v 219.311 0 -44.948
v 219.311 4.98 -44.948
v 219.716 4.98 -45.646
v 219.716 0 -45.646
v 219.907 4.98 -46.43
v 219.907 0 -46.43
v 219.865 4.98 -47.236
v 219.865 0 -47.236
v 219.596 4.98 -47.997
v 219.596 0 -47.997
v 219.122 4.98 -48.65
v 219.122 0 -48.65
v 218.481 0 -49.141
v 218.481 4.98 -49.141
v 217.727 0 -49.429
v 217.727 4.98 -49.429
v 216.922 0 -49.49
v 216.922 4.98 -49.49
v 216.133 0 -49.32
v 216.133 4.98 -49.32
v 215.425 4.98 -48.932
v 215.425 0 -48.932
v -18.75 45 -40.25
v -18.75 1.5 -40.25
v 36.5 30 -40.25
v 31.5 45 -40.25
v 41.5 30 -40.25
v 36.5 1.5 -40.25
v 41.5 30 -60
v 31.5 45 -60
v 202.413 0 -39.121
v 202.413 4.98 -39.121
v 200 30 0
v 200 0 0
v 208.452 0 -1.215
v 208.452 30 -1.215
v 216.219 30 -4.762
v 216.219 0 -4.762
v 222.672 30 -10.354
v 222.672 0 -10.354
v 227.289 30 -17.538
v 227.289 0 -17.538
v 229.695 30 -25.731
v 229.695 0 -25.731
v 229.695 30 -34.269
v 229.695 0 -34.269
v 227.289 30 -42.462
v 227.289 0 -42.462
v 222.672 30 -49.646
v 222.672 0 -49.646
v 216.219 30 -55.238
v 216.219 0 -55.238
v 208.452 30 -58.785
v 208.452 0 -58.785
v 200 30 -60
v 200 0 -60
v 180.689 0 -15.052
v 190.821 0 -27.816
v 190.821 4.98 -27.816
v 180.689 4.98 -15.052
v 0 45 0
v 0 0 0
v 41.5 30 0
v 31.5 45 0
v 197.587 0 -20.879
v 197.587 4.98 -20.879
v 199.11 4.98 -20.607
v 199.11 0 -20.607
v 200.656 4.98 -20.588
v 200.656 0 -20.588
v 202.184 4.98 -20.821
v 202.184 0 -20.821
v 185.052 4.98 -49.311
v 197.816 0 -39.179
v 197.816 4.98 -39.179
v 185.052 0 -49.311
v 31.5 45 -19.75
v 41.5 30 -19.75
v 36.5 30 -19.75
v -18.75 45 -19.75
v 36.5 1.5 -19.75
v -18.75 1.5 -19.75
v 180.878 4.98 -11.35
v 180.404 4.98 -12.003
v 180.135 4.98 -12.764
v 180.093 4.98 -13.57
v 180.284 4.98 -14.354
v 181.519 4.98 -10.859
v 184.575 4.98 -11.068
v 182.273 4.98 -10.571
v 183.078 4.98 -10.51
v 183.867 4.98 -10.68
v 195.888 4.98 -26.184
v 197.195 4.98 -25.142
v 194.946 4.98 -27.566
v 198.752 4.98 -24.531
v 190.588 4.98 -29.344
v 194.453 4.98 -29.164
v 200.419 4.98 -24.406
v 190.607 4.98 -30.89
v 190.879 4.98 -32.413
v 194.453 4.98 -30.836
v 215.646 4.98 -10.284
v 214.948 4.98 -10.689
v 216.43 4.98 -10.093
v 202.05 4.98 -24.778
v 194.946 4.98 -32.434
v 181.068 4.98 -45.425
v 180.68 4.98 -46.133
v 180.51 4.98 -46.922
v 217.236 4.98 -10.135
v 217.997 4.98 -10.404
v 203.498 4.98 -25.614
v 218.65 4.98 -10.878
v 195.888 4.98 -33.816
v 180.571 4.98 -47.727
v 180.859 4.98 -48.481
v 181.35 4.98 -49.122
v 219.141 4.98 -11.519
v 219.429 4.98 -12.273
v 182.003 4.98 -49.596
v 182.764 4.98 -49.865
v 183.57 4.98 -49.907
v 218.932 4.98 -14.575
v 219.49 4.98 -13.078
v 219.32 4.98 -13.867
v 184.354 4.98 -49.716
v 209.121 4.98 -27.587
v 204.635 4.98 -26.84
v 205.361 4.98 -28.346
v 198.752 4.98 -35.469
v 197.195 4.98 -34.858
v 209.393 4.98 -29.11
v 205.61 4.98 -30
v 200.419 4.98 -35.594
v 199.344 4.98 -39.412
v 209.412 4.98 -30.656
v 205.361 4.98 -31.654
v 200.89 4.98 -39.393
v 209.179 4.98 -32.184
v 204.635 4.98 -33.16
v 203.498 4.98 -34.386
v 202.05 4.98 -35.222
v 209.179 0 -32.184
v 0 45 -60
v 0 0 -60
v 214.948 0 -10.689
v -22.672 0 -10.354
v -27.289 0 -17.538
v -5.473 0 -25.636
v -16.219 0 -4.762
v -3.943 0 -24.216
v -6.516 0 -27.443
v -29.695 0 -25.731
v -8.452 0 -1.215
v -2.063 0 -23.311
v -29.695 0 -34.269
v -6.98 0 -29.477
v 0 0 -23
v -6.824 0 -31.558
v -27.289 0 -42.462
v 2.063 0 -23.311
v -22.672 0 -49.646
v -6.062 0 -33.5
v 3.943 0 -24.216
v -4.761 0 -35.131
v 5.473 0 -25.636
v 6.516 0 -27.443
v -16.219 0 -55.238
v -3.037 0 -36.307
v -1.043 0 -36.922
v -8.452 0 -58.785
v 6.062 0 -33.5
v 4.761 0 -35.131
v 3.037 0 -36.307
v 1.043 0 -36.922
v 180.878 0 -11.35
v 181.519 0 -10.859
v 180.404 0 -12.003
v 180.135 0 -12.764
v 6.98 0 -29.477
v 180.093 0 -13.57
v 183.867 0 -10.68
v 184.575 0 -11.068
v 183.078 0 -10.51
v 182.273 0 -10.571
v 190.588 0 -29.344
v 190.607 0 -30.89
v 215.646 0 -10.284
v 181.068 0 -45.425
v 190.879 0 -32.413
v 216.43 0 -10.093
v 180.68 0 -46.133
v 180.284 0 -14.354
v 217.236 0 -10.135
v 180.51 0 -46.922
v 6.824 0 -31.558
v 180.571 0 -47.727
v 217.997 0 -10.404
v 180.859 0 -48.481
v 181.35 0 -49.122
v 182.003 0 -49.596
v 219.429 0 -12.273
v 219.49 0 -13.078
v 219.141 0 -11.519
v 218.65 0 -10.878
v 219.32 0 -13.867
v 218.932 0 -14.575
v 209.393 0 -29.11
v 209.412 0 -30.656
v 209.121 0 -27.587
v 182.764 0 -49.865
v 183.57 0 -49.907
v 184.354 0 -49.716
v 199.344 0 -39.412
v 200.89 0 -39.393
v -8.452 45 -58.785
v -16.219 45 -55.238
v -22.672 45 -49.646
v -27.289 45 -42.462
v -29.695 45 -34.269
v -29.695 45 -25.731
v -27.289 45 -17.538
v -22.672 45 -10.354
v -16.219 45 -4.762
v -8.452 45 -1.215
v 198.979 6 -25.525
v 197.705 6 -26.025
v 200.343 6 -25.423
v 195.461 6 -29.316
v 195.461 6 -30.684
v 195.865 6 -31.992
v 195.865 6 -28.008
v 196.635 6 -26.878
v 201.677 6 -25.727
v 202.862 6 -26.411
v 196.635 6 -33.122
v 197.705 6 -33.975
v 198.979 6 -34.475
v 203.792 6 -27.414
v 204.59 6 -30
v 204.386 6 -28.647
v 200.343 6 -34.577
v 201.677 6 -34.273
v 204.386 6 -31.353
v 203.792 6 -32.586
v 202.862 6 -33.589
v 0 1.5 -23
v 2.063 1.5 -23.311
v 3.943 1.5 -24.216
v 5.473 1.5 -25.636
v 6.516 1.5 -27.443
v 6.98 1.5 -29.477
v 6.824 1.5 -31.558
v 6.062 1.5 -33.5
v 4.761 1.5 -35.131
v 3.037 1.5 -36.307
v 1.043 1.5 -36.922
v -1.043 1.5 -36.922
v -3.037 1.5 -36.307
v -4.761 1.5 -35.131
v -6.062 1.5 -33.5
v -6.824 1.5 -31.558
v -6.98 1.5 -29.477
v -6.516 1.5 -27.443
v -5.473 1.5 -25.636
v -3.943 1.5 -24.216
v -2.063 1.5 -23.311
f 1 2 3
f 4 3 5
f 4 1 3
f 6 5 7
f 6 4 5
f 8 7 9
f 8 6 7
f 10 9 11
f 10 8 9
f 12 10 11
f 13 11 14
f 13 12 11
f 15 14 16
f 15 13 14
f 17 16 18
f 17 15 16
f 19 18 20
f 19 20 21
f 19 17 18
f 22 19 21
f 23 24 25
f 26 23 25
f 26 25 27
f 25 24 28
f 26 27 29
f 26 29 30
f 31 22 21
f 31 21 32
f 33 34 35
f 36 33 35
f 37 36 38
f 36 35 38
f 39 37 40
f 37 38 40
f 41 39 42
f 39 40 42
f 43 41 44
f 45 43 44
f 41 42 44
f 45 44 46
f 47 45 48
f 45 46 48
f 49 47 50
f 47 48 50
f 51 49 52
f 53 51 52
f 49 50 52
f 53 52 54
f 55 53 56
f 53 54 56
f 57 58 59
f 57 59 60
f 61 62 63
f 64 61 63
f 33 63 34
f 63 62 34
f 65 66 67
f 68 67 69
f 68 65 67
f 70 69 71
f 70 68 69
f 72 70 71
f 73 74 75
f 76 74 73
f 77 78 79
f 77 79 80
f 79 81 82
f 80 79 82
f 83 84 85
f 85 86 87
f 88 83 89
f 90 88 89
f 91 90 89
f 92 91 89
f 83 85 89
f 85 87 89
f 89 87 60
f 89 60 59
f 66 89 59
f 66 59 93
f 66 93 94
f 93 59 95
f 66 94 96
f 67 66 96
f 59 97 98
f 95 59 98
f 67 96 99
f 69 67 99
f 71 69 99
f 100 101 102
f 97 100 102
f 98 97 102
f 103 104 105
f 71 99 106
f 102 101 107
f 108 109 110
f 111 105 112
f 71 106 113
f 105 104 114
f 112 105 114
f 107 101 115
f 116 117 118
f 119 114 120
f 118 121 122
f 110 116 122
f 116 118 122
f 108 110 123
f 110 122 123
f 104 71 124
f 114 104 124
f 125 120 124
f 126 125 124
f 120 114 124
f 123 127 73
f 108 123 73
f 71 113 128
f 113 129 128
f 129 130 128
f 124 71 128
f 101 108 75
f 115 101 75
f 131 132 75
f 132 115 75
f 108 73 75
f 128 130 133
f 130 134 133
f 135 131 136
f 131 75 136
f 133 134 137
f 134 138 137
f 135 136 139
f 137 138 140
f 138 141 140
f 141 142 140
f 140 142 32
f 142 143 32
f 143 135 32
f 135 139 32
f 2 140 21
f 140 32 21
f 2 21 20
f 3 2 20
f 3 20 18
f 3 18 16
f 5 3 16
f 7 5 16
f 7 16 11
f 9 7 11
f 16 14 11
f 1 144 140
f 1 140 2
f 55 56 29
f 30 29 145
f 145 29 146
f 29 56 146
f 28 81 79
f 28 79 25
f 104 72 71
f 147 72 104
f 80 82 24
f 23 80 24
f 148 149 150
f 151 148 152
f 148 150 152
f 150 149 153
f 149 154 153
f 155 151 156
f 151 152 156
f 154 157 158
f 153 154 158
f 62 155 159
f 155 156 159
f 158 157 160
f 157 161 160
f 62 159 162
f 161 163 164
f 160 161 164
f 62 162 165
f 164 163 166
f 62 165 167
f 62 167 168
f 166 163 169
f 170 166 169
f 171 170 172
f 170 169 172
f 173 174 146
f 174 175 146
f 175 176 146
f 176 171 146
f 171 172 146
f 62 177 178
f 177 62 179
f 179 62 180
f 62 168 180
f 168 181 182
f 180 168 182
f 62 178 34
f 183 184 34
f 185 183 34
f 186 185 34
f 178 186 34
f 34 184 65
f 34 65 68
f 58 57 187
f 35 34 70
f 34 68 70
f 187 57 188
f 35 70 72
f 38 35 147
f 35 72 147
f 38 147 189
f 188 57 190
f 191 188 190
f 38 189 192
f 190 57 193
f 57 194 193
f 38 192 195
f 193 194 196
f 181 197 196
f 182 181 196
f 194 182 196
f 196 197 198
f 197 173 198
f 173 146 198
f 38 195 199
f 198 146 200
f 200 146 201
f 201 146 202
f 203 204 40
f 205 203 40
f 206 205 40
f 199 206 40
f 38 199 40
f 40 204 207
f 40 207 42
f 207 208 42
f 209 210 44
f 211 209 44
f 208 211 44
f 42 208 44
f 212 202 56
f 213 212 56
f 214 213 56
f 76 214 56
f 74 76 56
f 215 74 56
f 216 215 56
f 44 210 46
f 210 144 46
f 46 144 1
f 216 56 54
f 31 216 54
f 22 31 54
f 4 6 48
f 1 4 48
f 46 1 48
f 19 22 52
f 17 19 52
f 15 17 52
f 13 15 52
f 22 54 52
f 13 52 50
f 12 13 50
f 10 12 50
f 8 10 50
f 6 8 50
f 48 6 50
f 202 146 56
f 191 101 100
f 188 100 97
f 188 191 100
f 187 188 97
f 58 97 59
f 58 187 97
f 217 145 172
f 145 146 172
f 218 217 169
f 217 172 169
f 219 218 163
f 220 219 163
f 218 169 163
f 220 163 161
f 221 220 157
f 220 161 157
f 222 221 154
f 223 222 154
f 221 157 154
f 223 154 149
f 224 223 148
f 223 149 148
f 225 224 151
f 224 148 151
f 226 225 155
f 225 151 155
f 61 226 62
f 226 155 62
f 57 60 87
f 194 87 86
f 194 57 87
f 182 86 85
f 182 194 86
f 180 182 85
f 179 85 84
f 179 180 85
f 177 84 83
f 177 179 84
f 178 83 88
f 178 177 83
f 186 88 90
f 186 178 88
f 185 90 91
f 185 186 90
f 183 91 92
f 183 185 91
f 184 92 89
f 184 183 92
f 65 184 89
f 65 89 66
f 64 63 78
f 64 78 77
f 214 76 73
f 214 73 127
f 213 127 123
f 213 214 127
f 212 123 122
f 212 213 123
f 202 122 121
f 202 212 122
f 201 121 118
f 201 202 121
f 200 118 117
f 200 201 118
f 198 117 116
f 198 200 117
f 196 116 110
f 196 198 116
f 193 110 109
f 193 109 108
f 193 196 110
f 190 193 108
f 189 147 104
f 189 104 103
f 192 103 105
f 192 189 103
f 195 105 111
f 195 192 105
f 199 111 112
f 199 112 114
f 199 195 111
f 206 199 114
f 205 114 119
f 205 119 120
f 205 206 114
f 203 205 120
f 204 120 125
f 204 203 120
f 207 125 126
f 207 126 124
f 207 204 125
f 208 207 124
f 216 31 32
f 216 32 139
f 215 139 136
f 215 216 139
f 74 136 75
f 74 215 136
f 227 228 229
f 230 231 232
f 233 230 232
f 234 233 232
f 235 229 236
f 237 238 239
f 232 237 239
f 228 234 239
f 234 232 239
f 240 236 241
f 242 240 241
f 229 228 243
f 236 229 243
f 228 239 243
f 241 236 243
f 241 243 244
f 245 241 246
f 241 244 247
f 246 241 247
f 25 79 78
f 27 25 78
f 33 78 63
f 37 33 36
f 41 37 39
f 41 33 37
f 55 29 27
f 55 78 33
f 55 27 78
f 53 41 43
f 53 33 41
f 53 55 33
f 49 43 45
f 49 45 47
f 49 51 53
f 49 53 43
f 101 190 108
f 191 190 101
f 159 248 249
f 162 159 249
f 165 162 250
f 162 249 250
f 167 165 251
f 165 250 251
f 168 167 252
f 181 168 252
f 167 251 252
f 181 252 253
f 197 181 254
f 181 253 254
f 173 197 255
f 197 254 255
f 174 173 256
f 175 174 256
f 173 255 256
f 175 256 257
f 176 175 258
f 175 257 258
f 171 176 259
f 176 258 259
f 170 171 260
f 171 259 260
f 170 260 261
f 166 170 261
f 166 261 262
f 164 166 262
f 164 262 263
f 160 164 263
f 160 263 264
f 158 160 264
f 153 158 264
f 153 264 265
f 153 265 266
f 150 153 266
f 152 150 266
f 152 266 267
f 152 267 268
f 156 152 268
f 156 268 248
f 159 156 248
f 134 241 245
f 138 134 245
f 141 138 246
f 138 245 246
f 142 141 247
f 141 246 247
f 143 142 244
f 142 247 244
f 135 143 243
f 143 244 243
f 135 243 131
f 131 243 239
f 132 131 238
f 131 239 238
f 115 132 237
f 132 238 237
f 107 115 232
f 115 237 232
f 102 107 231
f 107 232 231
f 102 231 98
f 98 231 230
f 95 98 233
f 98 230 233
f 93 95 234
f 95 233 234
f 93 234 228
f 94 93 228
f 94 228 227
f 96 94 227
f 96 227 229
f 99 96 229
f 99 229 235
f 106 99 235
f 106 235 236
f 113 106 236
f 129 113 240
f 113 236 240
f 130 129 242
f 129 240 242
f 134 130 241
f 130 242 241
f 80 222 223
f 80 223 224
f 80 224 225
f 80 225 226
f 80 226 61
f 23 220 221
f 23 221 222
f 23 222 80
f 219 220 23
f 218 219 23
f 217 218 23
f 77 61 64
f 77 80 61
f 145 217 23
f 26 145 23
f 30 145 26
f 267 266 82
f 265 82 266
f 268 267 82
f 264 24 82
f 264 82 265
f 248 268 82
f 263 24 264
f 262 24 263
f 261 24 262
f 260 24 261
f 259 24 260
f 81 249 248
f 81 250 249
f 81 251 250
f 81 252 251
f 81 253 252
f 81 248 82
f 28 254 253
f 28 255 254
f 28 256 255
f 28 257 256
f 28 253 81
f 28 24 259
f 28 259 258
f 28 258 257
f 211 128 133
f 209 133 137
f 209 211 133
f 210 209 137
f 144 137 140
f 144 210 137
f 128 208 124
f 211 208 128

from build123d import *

# Parameters (mm, degrees)
BOSS_EXTRUDE1_DEPTH = 30
SKETCH2_R           = 7
CUT_EXTRUDE1_DEPTH  = 240.582971014
CUT_EXTRUDE2_DEPTH  = 28.5
BOSS_EXTRUDE2_DEPTH = 15
CUT_EXTRUDE3_DEPTH  = 242.919408068
CAVITY1_START       = -1
CAVITY1_OUTLINE_R   = 1.02
CAVITY1_DEPTH       = 5.98
CAVITY1_START_2     = 2.94
CAVITY1_2_OUTLINE_R = 1.683
CAVITY1_2_DEPTH     = 2.04
CAVITY1_START_3     = 4.98
CAVITY1_3_OUTLINE_R = 2.805
CAVITY1_3_DEPTH     = 1.02
SKETCH6_R           = 1.02
SKETCH6_R_2         = 5.61
CUT_EXTRUDE4_DEPTH  = 4.98
CUT_EXTRUDE5_START  = -1.02
SKETCH7_R           = 2.805
CUT_EXTRUDE5_DEPTH  = 1.02


with BuildPart() as part:
    # Sketch1 → Boss-Extrude1 (new body)
    with BuildSketch(Plane(origin=(0, 0, 0), x_dir=(1, 0, 0), z_dir=(0, 1, 0))):
        with BuildLine():
            Line((0, 0), (200, 0))
            ThreePointArc((200, 0), (230, 30), (200, 60))
            Line((200, 60), (0, 60))
            ThreePointArc((0, 60), (-30, 30), (0, 0))
        make_face()
    extrude(amount=BOSS_EXTRUDE1_DEPTH)

    # Sketch2 → Cut-Extrude1 (cut, through all)
    with BuildSketch(Plane(origin=(0, 30, 0), x_dir=(1, 0, 0), z_dir=(0, 1, 0))):
        with Locations(Location((0, 30, 0), (0, 0, 270))):
            Circle(SKETCH2_R)
    extrude(amount=-CUT_EXTRUDE1_DEPTH, mode=Mode.SUBTRACT)

    # Sketch3 → Cut-Extrude2 (cut)
    with BuildSketch(Plane(origin=(0, 30, 0), x_dir=(1, 0, 0), z_dir=(0, 1, 0))):
        Polygon((-18.75, 40.25), (-18.75, 19.75), (0, 19.75), (36.5, 19.75), (36.5, 40.25), (0, 40.25), align=None)
    extrude(amount=-CUT_EXTRUDE2_DEPTH, mode=Mode.SUBTRACT)

    # Sketch4 → Boss-Extrude2 (add)
    with BuildSketch(Plane(origin=(0, 30, 0), x_dir=(1, 0, 0), z_dir=(0, 1, 0))):
        with BuildLine():
            Line((-18.75, 40.25), (41.5, 40.25))
            Line((41.5, 40.25), (41.5, 60))
            Line((41.5, 60), (0, 60))
            ThreePointArc((0, 60), (-30, 30), (0, 0))
            Line((0, 0), (41.5, 0))
            Line((41.5, 0), (41.5, 19.75))
            Line((41.5, 19.75), (-18.75, 19.75))
            Line((-18.75, 19.75), (-18.75, 40.25))
        make_face()
    extrude(amount=BOSS_EXTRUDE2_DEPTH)

    # Sketch5 → Cut-Extrude3 (cut, through all)
    with BuildSketch(Plane.XY):
        Polygon((31.5, 45), (41.5, 45), (41.5, 30), align=None)
    extrude(amount=-CUT_EXTRUDE3_DEPTH, mode=Mode.SUBTRACT)

    # Cavity1: read off the stored shape, not the designer's step
    # Cavity1 outline → Cavity1 (cut)
    with BuildSketch(Plane(origin=(0, 0, 0), x_dir=(1, 0, 0), z_dir=(0, 1, 0)).offset(CAVITY1_START)):
        with BuildLine():
            Line((215.425139365, 48.931566971), (202.412835688, 39.121263561))
            ThreePointArc((202.412835688, 39.121263561), (200.117760104, 39.434265078), (197.815586916, 39.178647203))
            Line((197.815586916, 39.178647203), (185.052206965, 49.310687088))
            ThreePointArc((185.052206965, 49.310687088), (181.349681661, 49.121796309), (181.068433029, 45.425139365))
            Line((181.068433029, 45.425139365), (190.878736439, 32.412835688))
            ThreePointArc((190.878736439, 32.412835688), (190.565734922, 30.117760104), (190.821352797, 27.815586916))
            Line((190.821352797, 27.815586916), (180.689312912, 15.052206965))
            ThreePointArc((180.689312912, 15.052206965), (180.878203691, 11.349681661), (184.574860635, 11.068433029))
            Line((184.574860635, 11.068433029), (197.587164312, 20.878736439))
            ThreePointArc((197.587164312, 20.878736439), (199.882239896, 20.565734922), (202.184413084, 20.821352797))
            Line((202.184413084, 20.821352797), (214.947793035, 10.689312912))
            ThreePointArc((214.947793035, 10.689312912), (218.650318339, 10.878203691), (218.931566971, 14.574860635))
            Line((218.931566971, 14.574860635), (209.121263561, 27.587164312))
            ThreePointArc((209.121263561, 27.587164312), (209.434265078, 29.882239896), (209.178647203, 32.184413084))
            Line((209.178647203, 32.184413084), (219.310687088, 44.947793035))
            ThreePointArc((219.310687088, 44.947793035), (219.121796309, 48.650318339), (215.425139365, 48.931566971))
        make_face()
        with Locations((183.022971201, 13.441566555)):
            Circle(CAVITY1_OUTLINE_R, mode=Mode.SUBTRACT)
        with Locations((186.673945136, 17.002519984)):
            Circle(CAVITY1_OUTLINE_R, mode=Mode.SUBTRACT)
        with Locations((190.324919072, 20.563473413)):
            Circle(CAVITY1_OUTLINE_R, mode=Mode.SUBTRACT)
        with Locations((193.975893007, 24.124426842)):
            Circle(CAVITY1_OUTLINE_R, mode=Mode.SUBTRACT)
        with Locations((216.558433445, 13.022971201)):
            Circle(CAVITY1_OUTLINE_R, mode=Mode.SUBTRACT)
        with Locations((212.997480016, 16.673945136)):
            Circle(CAVITY1_OUTLINE_R, mode=Mode.SUBTRACT)
        with Locations((209.436526587, 20.324919072)):
            Circle(CAVITY1_OUTLINE_R, mode=Mode.SUBTRACT)
        with Locations((205.875573158, 23.975893007)):
            Circle(CAVITY1_OUTLINE_R, mode=Mode.SUBTRACT)
        with Locations((194.124426842, 36.024106993)):
            Circle(CAVITY1_OUTLINE_R, mode=Mode.SUBTRACT)
        with Locations((190.563473413, 39.675080928)):
            Circle(CAVITY1_OUTLINE_R, mode=Mode.SUBTRACT)
        with Locations((187.002519984, 43.326054864)):
            Circle(CAVITY1_OUTLINE_R, mode=Mode.SUBTRACT)
        with Locations((183.441566555, 46.977028799)):
            Circle(CAVITY1_OUTLINE_R, mode=Mode.SUBTRACT)
        with BuildLine():
            Line((202.58182093, 32.319782958), (203.124264185, 32.623999486))
            ThreePointArc((203.124264185, 32.623999486), (203.267629631, 32.443153003), (203.400540503, 32.254489806))
            Line((203.400540503, 32.254489806), (202.955317585, 31.82024456))
            Line((202.955317585, 31.82024456), (203.094251525, 31.572513843))
            Line((203.094251525, 31.572513843), (203.696948506, 31.725969798))
            ThreePointArc((203.696948506, 31.725969798), (203.788622379, 31.514179802), (203.868174794, 31.297545283))
            Line((203.868174794, 31.297545283), (203.325731539, 30.993328755))
            Line((203.325731539, 30.993328755), (203.395813992, 30.718080508))
            Line((203.395813992, 30.718080508), (204.017691895, 30.710318122))
            ThreePointArc((204.017691895, 30.710318122), (204.051426772, 30.48201775), (204.072199365, 30.252175193))
            Line((204.072199365, 30.252175193), (203.469502385, 30.098719237))
            Line((203.469502385, 30.098719237), (203.465957348, 29.814711173))
            Line((203.465957348, 29.814711173), (204.064636222, 29.646259439))
            ThreePointArc((204.064636222, 29.646259439), (204.038133126, 29.417006985), (203.99871028, 29.189619781))
            Line((203.99871028, 29.189619781), (203.376832377, 29.197382167))
            Line((203.376832377, 29.197382167), (203.299901438, 28.923968965))
            Line((203.299901438, 28.923968965), (203.834582307, 28.60630759))
            ThreePointArc((203.834582307, 28.60630759), (203.749647381, 28.391726231), (203.652715696, 28.182290441))
            Line((203.652715696, 28.182290441), (203.054036822, 28.350742175))
            Line((203.054036822, 28.350742175), (202.908962698, 28.106556495))
            Line((202.908962698, 28.106556495), (203.343207945, 27.661333577))
            ThreePointArc((203.343207945, 27.661333577), (203.205629364, 27.476046676), (203.057794575, 27.298835003))
            Line((203.057794575, 27.298835003), (202.523113706, 27.616496378))
            Line((202.523113706, 27.616496378), (202.319782958, 27.41817907))
            Line((202.319782958, 27.41817907), (202.623999486, 26.875735815))
            ThreePointArc((202.623999486, 26.875735815), (202.443153003, 26.732370369), (202.254489806, 26.599459497))
            Line((202.254489806, 26.599459497), (201.82024456, 27.044682415))
            Line((201.82024456, 27.044682415), (201.572513843, 26.905748475))
            Line((201.572513843, 26.905748475), (201.725969798, 26.303051494))
            ThreePointArc((201.725969798, 26.303051494), (201.514179802, 26.211377621), (201.297545283, 26.131825206))
            Line((201.297545283, 26.131825206), (200.993328755, 26.674268461))
            Line((200.993328755, 26.674268461), (200.718080508, 26.604186008))
            Line((200.718080508, 26.604186008), (200.710318122, 25.982308105))
            ThreePointArc((200.710318122, 25.982308105), (200.48201775, 25.948573228), (200.252175193, 25.927800635))
            Line((200.252175193, 25.927800635), (200.098719237, 26.530497615))
            Line((200.098719237, 26.530497615), (199.814711173, 26.534042652))
            Line((199.814711173, 26.534042652), (199.646259439, 25.935363778))
            ThreePointArc((199.646259439, 25.935363778), (199.417006985, 25.961866874), (199.189619781, 26.00128972))
            Line((199.189619781, 26.00128972), (199.197382167, 26.623167623))
            Line((199.197382167, 26.623167623), (198.923968965, 26.700098562))
            Line((198.923968965, 26.700098562), (198.60630759, 26.165417693))
            ThreePointArc((198.60630759, 26.165417693), (198.391726231, 26.250352619), (198.182290441, 26.347284304))
            Line((198.182290441, 26.347284304), (198.350742175, 26.945963178))
            Line((198.350742175, 26.945963178), (198.106556495, 27.091037302))
            Line((198.106556495, 27.091037302), (197.661333577, 26.656792055))
            ThreePointArc((197.661333577, 26.656792055), (197.476046676, 26.794370636), (197.298835003, 26.942205425))
            Line((197.298835003, 26.942205425), (197.616496378, 27.476886294))
            Line((197.616496378, 27.476886294), (197.41817907, 27.680217042))
            Line((197.41817907, 27.680217042), (196.875735815, 27.376000514))
            ThreePointArc((196.875735815, 27.376000514), (196.732370369, 27.556846997), (196.599459497, 27.745510194))
            Line((196.599459497, 27.745510194), (197.044682415, 28.17975544))
            Line((197.044682415, 28.17975544), (196.905748475, 28.427486157))
            Line((196.905748475, 28.427486157), (196.303051494, 28.274030202))
            ThreePointArc((196.303051494, 28.274030202), (196.211377621, 28.485820198), (196.131825206, 28.702454717))
            Line((196.131825206, 28.702454717), (196.674268461, 29.006671245))
            Line((196.674268461, 29.006671245), (196.604186008, 29.281919492))
            Line((196.604186008, 29.281919492), (195.982308105, 29.289681878))
            ThreePointArc((195.982308105, 29.289681878), (195.948573228, 29.51798225), (195.927800635, 29.747824807))
            Line((195.927800635, 29.747824807), (196.530497615, 29.901280763))
            Line((196.530497615, 29.901280763), (196.534042652, 30.185288827))
            Line((196.534042652, 30.185288827), (195.935363778, 30.353740561))
            ThreePointArc((195.935363778, 30.353740561), (195.961866874, 30.582993015), (196.00128972, 30.810380219))
            Line((196.00128972, 30.810380219), (196.623167623, 30.802617833))
            Line((196.623167623, 30.802617833), (196.700098562, 31.076031035))
            Line((196.700098562, 31.076031035), (196.165417693, 31.39369241))
            ThreePointArc((196.165417693, 31.39369241), (196.250352619, 31.608273769), (196.347284304, 31.817709559))
            Line((196.347284304, 31.817709559), (196.945963178, 31.649257825))
            Line((196.945963178, 31.649257825), (197.091037302, 31.893443505))
            Line((197.091037302, 31.893443505), (196.656792055, 32.338666423))
            ThreePointArc((196.656792055, 32.338666423), (196.794370636, 32.523953324), (196.942205425, 32.701164997))
            Line((196.942205425, 32.701164997), (197.476886294, 32.383503622))
            Line((197.476886294, 32.383503622), (197.680217042, 32.58182093))
            Line((197.680217042, 32.58182093), (197.376000514, 33.124264185))
            ThreePointArc((197.376000514, 33.124264185), (197.556846997, 33.267629631), (197.745510194, 33.400540503))
            Line((197.745510194, 33.400540503), (198.17975544, 32.955317585))
            Line((198.17975544, 32.955317585), (198.427486157, 33.094251525))
            Line((198.427486157, 33.094251525), (198.274030202, 33.696948506))
            ThreePointArc((198.274030202, 33.696948506), (198.485820198, 33.788622379), (198.702454717, 33.868174794))
            Line((198.702454717, 33.868174794), (199.006671245, 33.325731539))
            Line((199.006671245, 33.325731539), (199.281919492, 33.395813992))
            Line((199.281919492, 33.395813992), (199.289681878, 34.017691895))
            ThreePointArc((199.289681878, 34.017691895), (199.51798225, 34.051426772), (199.747824807, 34.072199365))
            Line((199.747824807, 34.072199365), (199.901280763, 33.469502385))
            Line((199.901280763, 33.469502385), (200.185288827, 33.465957348))
            Line((200.185288827, 33.465957348), (200.353740561, 34.064636222))
            ThreePointArc((200.353740561, 34.064636222), (200.582993015, 34.038133126), (200.810380219, 33.99871028))
            Line((200.810380219, 33.99871028), (200.802617833, 33.376832377))
            Line((200.802617833, 33.376832377), (201.076031035, 33.299901438))
            Line((201.076031035, 33.299901438), (201.39369241, 33.834582307))
            ThreePointArc((201.39369241, 33.834582307), (201.608273769, 33.749647381), (201.817709559, 33.652715696))
            Line((201.817709559, 33.652715696), (201.649257825, 33.054036822))
            Line((201.649257825, 33.054036822), (201.893443505, 32.908962698))
            Line((201.893443505, 32.908962698), (202.338666423, 33.343207945))
            ThreePointArc((202.338666423, 33.343207945), (202.523953324, 33.205629364), (202.701164997, 33.057794575))
            Line((202.701164997, 33.057794575), (202.383503622, 32.523113706))
            Line((202.383503622, 32.523113706), (202.58182093, 32.319782958))
        make_face(mode=Mode.SUBTRACT)
        with Locations((206.024106993, 35.875573158)):
            Circle(CAVITY1_OUTLINE_R, mode=Mode.SUBTRACT)
        with Locations((209.675080928, 39.436526587)):
            Circle(CAVITY1_OUTLINE_R, mode=Mode.SUBTRACT)
        with Locations((213.326054864, 42.997480016)):
            Circle(CAVITY1_OUTLINE_R, mode=Mode.SUBTRACT)
        with Locations((216.977028799, 46.558433445)):
            Circle(CAVITY1_OUTLINE_R, mode=Mode.SUBTRACT)
    extrude(amount=CAVITY1_DEPTH, mode=Mode.SUBTRACT)

    # Cavity1 2 outline → Cavity1 2 (cut)
    with BuildSketch(Plane(origin=(0, 0, 0), x_dir=(1, 0, 0), z_dir=(0, 1, 0)).offset(CAVITY1_START_2)):
        with BuildLine():
            ThreePointArc((203.400540503, 32.254489806), (203.267629631, 32.443153003), (203.124264185, 32.623999486))
            Line((203.124264185, 32.623999486), (202.58182093, 32.319782958))
            Line((202.58182093, 32.319782958), (202.383503622, 32.523113706))
            Line((202.383503622, 32.523113706), (202.701164997, 33.057794575))
            ThreePointArc((202.701164997, 33.057794575), (202.523953324, 33.205629364), (202.338666423, 33.343207945))
            Line((202.338666423, 33.343207945), (201.893443505, 32.908962698))
            Line((201.893443505, 32.908962698), (201.649257825, 33.054036822))
            Line((201.649257825, 33.054036822), (201.817709559, 33.652715696))
            ThreePointArc((201.817709559, 33.652715696), (201.608273769, 33.749647381), (201.39369241, 33.834582307))
            Line((201.39369241, 33.834582307), (201.076031035, 33.299901438))
            Line((201.076031035, 33.299901438), (200.802617833, 33.376832377))
            Line((200.802617833, 33.376832377), (200.810380219, 33.99871028))
            ThreePointArc((200.810380219, 33.99871028), (200.582993015, 34.038133126), (200.353740561, 34.064636222))
            Line((200.353740561, 34.064636222), (200.185288827, 33.465957348))
            Line((200.185288827, 33.465957348), (199.901280763, 33.469502385))
            Line((199.901280763, 33.469502385), (199.747824807, 34.072199365))
            ThreePointArc((199.747824807, 34.072199365), (199.51798225, 34.051426772), (199.289681878, 34.017691895))
            Line((199.289681878, 34.017691895), (199.281919492, 33.395813992))
            Line((199.281919492, 33.395813992), (199.006671245, 33.325731539))
            Line((199.006671245, 33.325731539), (198.702454717, 33.868174794))
            ThreePointArc((198.702454717, 33.868174794), (198.485820198, 33.788622379), (198.274030202, 33.696948506))
            Line((198.274030202, 33.696948506), (198.427486157, 33.094251525))
            Line((198.427486157, 33.094251525), (198.17975544, 32.955317585))
            Line((198.17975544, 32.955317585), (197.745510194, 33.400540503))
            ThreePointArc((197.745510194, 33.400540503), (197.556846997, 33.267629631), (197.376000514, 33.124264185))
            Line((197.376000514, 33.124264185), (197.680217042, 32.58182093))
            Line((197.680217042, 32.58182093), (197.476886294, 32.383503622))
            Line((197.476886294, 32.383503622), (196.942205425, 32.701164997))
            ThreePointArc((196.942205425, 32.701164997), (196.794370636, 32.523953324), (196.656792055, 32.338666423))
            Line((196.656792055, 32.338666423), (197.091037302, 31.893443505))
            Line((197.091037302, 31.893443505), (196.945963178, 31.649257825))
            Line((196.945963178, 31.649257825), (196.347284304, 31.817709559))
            ThreePointArc((196.347284304, 31.817709559), (196.250352619, 31.608273769), (196.165417693, 31.39369241))
            Line((196.165417693, 31.39369241), (196.700098562, 31.076031035))
            Line((196.700098562, 31.076031035), (196.623167623, 30.802617833))
            Line((196.623167623, 30.802617833), (196.00128972, 30.810380219))
            ThreePointArc((196.00128972, 30.810380219), (195.961866874, 30.582993015), (195.935363778, 30.353740561))
            Line((195.935363778, 30.353740561), (196.534042652, 30.185288827))
            Line((196.534042652, 30.185288827), (196.530497615, 29.901280763))
            Line((196.530497615, 29.901280763), (195.927800635, 29.747824807))
            ThreePointArc((195.927800635, 29.747824807), (195.948573228, 29.51798225), (195.982308105, 29.289681878))
            Line((195.982308105, 29.289681878), (196.604186008, 29.281919492))
            Line((196.604186008, 29.281919492), (196.674268461, 29.006671245))
            Line((196.674268461, 29.006671245), (196.131825206, 28.702454717))
            ThreePointArc((196.131825206, 28.702454717), (196.211377621, 28.485820198), (196.303051494, 28.274030202))
            Line((196.303051494, 28.274030202), (196.905748475, 28.427486157))
            Line((196.905748475, 28.427486157), (197.044682415, 28.17975544))
            Line((197.044682415, 28.17975544), (196.599459497, 27.745510194))
            ThreePointArc((196.599459497, 27.745510194), (196.732370369, 27.556846997), (196.875735815, 27.376000514))
            Line((196.875735815, 27.376000514), (197.41817907, 27.680217042))
            Line((197.41817907, 27.680217042), (197.616496378, 27.476886294))
            Line((197.616496378, 27.476886294), (197.298835003, 26.942205425))
            ThreePointArc((197.298835003, 26.942205425), (197.476046676, 26.794370636), (197.661333577, 26.656792055))
            Line((197.661333577, 26.656792055), (198.106556495, 27.091037302))
            Line((198.106556495, 27.091037302), (198.350742175, 26.945963178))
            Line((198.350742175, 26.945963178), (198.182290441, 26.347284304))
            ThreePointArc((198.182290441, 26.347284304), (198.391726231, 26.250352619), (198.60630759, 26.165417693))
            Line((198.60630759, 26.165417693), (198.923968965, 26.700098562))
            Line((198.923968965, 26.700098562), (199.197382167, 26.623167623))
            Line((199.197382167, 26.623167623), (199.189619781, 26.00128972))
            ThreePointArc((199.189619781, 26.00128972), (199.417006985, 25.961866874), (199.646259439, 25.935363778))
            Line((199.646259439, 25.935363778), (199.814711173, 26.534042652))
            Line((199.814711173, 26.534042652), (200.098719237, 26.530497615))
            Line((200.098719237, 26.530497615), (200.252175193, 25.927800635))
            ThreePointArc((200.252175193, 25.927800635), (200.48201775, 25.948573228), (200.710318122, 25.982308105))
            Line((200.710318122, 25.982308105), (200.718080508, 26.604186008))
            Line((200.718080508, 26.604186008), (200.993328755, 26.674268461))
            Line((200.993328755, 26.674268461), (201.297545283, 26.131825206))
            ThreePointArc((201.297545283, 26.131825206), (201.514179802, 26.211377621), (201.725969798, 26.303051494))
            Line((201.725969798, 26.303051494), (201.572513843, 26.905748475))
            Line((201.572513843, 26.905748475), (201.82024456, 27.044682415))
            Line((201.82024456, 27.044682415), (202.254489806, 26.599459497))
            ThreePointArc((202.254489806, 26.599459497), (202.443153003, 26.732370369), (202.623999486, 26.875735815))
            Line((202.623999486, 26.875735815), (202.319782958, 27.41817907))
            Line((202.319782958, 27.41817907), (202.523113706, 27.616496378))
            Line((202.523113706, 27.616496378), (203.057794575, 27.298835003))
            ThreePointArc((203.057794575, 27.298835003), (203.205629364, 27.476046676), (203.343207945, 27.661333577))
            Line((203.343207945, 27.661333577), (202.908962698, 28.106556495))
            Line((202.908962698, 28.106556495), (203.054036822, 28.350742175))
            Line((203.054036822, 28.350742175), (203.652715696, 28.182290441))
            ThreePointArc((203.652715696, 28.182290441), (203.749647381, 28.391726231), (203.834582307, 28.60630759))
            Line((203.834582307, 28.60630759), (203.299901438, 28.923968965))
            Line((203.299901438, 28.923968965), (203.376832377, 29.197382167))
            Line((203.376832377, 29.197382167), (203.99871028, 29.189619781))
            ThreePointArc((203.99871028, 29.189619781), (204.038133126, 29.417006985), (204.064636222, 29.646259439))
            Line((204.064636222, 29.646259439), (203.465957348, 29.814711173))
            Line((203.465957348, 29.814711173), (203.469502385, 30.098719237))
            Line((203.469502385, 30.098719237), (204.072199365, 30.252175193))
            ThreePointArc((204.072199365, 30.252175193), (204.051426772, 30.48201775), (204.017691895, 30.710318122))
            Line((204.017691895, 30.710318122), (203.395813992, 30.718080508))
            Line((203.395813992, 30.718080508), (203.325731539, 30.993328755))
            Line((203.325731539, 30.993328755), (203.868174794, 31.297545283))
            ThreePointArc((203.868174794, 31.297545283), (203.788622379, 31.514179802), (203.696948506, 31.725969798))
            Line((203.696948506, 31.725969798), (203.094251525, 31.572513843))
            Line((203.094251525, 31.572513843), (202.955317585, 31.82024456))
            Line((202.955317585, 31.82024456), (203.400540503, 32.254489806))
        make_face()
        with Locations((200, 30)):
            Circle(CAVITY1_2_OUTLINE_R, mode=Mode.SUBTRACT)
    extrude(amount=CAVITY1_2_DEPTH, mode=Mode.SUBTRACT)

    # Cavity1 3 outline → Cavity1 3 (cut)
    with BuildSketch(Plane(origin=(0, 0, 0), x_dir=(1, 0, 0), z_dir=(0, 1, 0)).offset(CAVITY1_START_3)):
        with BuildLine():
            ThreePointArc((203.400540503, 32.254489806), (203.267629631, 32.443153003), (203.124264185, 32.623999486))
            Line((203.124264185, 32.623999486), (202.58182093, 32.319782958))
            Line((202.58182093, 32.319782958), (202.383503622, 32.523113706))
            Line((202.383503622, 32.523113706), (202.701164997, 33.057794575))
            ThreePointArc((202.701164997, 33.057794575), (202.523953324, 33.205629364), (202.338666423, 33.343207945))
            Line((202.338666423, 33.343207945), (201.893443505, 32.908962698))
            Line((201.893443505, 32.908962698), (201.649257825, 33.054036822))
            Line((201.649257825, 33.054036822), (201.817709559, 33.652715696))
            ThreePointArc((201.817709559, 33.652715696), (201.608273769, 33.749647381), (201.39369241, 33.834582307))
            Line((201.39369241, 33.834582307), (201.076031035, 33.299901438))
            Line((201.076031035, 33.299901438), (200.802617833, 33.376832377))
            Line((200.802617833, 33.376832377), (200.810380219, 33.99871028))
            ThreePointArc((200.810380219, 33.99871028), (200.582993015, 34.038133126), (200.353740561, 34.064636222))
            Line((200.353740561, 34.064636222), (200.185288827, 33.465957348))
            Line((200.185288827, 33.465957348), (199.901280763, 33.469502385))
            Line((199.901280763, 33.469502385), (199.747824807, 34.072199365))
            ThreePointArc((199.747824807, 34.072199365), (199.51798225, 34.051426772), (199.289681878, 34.017691895))
            Line((199.289681878, 34.017691895), (199.281919492, 33.395813992))
            Line((199.281919492, 33.395813992), (199.006671245, 33.325731539))
            Line((199.006671245, 33.325731539), (198.702454717, 33.868174794))
            ThreePointArc((198.702454717, 33.868174794), (198.485820198, 33.788622379), (198.274030202, 33.696948506))
            Line((198.274030202, 33.696948506), (198.427486157, 33.094251525))
            Line((198.427486157, 33.094251525), (198.17975544, 32.955317585))
            Line((198.17975544, 32.955317585), (197.745510194, 33.400540503))
            ThreePointArc((197.745510194, 33.400540503), (197.556846997, 33.267629631), (197.376000514, 33.124264185))
            Line((197.376000514, 33.124264185), (197.680217042, 32.58182093))
            Line((197.680217042, 32.58182093), (197.476886294, 32.383503622))
            Line((197.476886294, 32.383503622), (196.942205425, 32.701164997))
            ThreePointArc((196.942205425, 32.701164997), (196.794370636, 32.523953324), (196.656792055, 32.338666423))
            Line((196.656792055, 32.338666423), (197.091037302, 31.893443505))
            Line((197.091037302, 31.893443505), (196.945963178, 31.649257825))
            Line((196.945963178, 31.649257825), (196.347284304, 31.817709559))
            ThreePointArc((196.347284304, 31.817709559), (196.250352619, 31.608273769), (196.165417693, 31.39369241))
            Line((196.165417693, 31.39369241), (196.700098562, 31.076031035))
            Line((196.700098562, 31.076031035), (196.623167623, 30.802617833))
            Line((196.623167623, 30.802617833), (196.00128972, 30.810380219))
            ThreePointArc((196.00128972, 30.810380219), (195.961866874, 30.582993015), (195.935363778, 30.353740561))
            Line((195.935363778, 30.353740561), (196.534042652, 30.185288827))
            Line((196.534042652, 30.185288827), (196.530497615, 29.901280763))
            Line((196.530497615, 29.901280763), (195.927800635, 29.747824807))
            ThreePointArc((195.927800635, 29.747824807), (195.948573228, 29.51798225), (195.982308105, 29.289681878))
            Line((195.982308105, 29.289681878), (196.604186008, 29.281919492))
            Line((196.604186008, 29.281919492), (196.674268461, 29.006671245))
            Line((196.674268461, 29.006671245), (196.131825206, 28.702454717))
            ThreePointArc((196.131825206, 28.702454717), (196.211377621, 28.485820198), (196.303051494, 28.274030202))
            Line((196.303051494, 28.274030202), (196.905748475, 28.427486157))
            Line((196.905748475, 28.427486157), (197.044682415, 28.17975544))
            Line((197.044682415, 28.17975544), (196.599459497, 27.745510194))
            ThreePointArc((196.599459497, 27.745510194), (196.732370369, 27.556846997), (196.875735815, 27.376000514))
            Line((196.875735815, 27.376000514), (197.41817907, 27.680217042))
            Line((197.41817907, 27.680217042), (197.616496378, 27.476886294))
            Line((197.616496378, 27.476886294), (197.298835003, 26.942205425))
            ThreePointArc((197.298835003, 26.942205425), (197.476046676, 26.794370636), (197.661333577, 26.656792055))
            Line((197.661333577, 26.656792055), (198.106556495, 27.091037302))
            Line((198.106556495, 27.091037302), (198.350742175, 26.945963178))
            Line((198.350742175, 26.945963178), (198.182290441, 26.347284304))
            ThreePointArc((198.182290441, 26.347284304), (198.391726231, 26.250352619), (198.60630759, 26.165417693))
            Line((198.60630759, 26.165417693), (198.923968965, 26.700098562))
            Line((198.923968965, 26.700098562), (199.197382167, 26.623167623))
            Line((199.197382167, 26.623167623), (199.189619781, 26.00128972))
            ThreePointArc((199.189619781, 26.00128972), (199.417006985, 25.961866874), (199.646259439, 25.935363778))
            Line((199.646259439, 25.935363778), (199.814711173, 26.534042652))
            Line((199.814711173, 26.534042652), (200.098719237, 26.530497615))
            Line((200.098719237, 26.530497615), (200.252175193, 25.927800635))
            ThreePointArc((200.252175193, 25.927800635), (200.48201775, 25.948573228), (200.710318122, 25.982308105))
            Line((200.710318122, 25.982308105), (200.718080508, 26.604186008))
            Line((200.718080508, 26.604186008), (200.993328755, 26.674268461))
            Line((200.993328755, 26.674268461), (201.297545283, 26.131825206))
            ThreePointArc((201.297545283, 26.131825206), (201.514179802, 26.211377621), (201.725969798, 26.303051494))
            Line((201.725969798, 26.303051494), (201.572513843, 26.905748475))
            Line((201.572513843, 26.905748475), (201.82024456, 27.044682415))
            Line((201.82024456, 27.044682415), (202.254489806, 26.599459497))
            ThreePointArc((202.254489806, 26.599459497), (202.443153003, 26.732370369), (202.623999486, 26.875735815))
            Line((202.623999486, 26.875735815), (202.319782958, 27.41817907))
            Line((202.319782958, 27.41817907), (202.523113706, 27.616496378))
            Line((202.523113706, 27.616496378), (203.057794575, 27.298835003))
            ThreePointArc((203.057794575, 27.298835003), (203.205629364, 27.476046676), (203.343207945, 27.661333577))
            Line((203.343207945, 27.661333577), (202.908962698, 28.106556495))
            Line((202.908962698, 28.106556495), (203.054036822, 28.350742175))
            Line((203.054036822, 28.350742175), (203.652715696, 28.182290441))
            ThreePointArc((203.652715696, 28.182290441), (203.749647381, 28.391726231), (203.834582307, 28.60630759))
            Line((203.834582307, 28.60630759), (203.299901438, 28.923968965))
            Line((203.299901438, 28.923968965), (203.376832377, 29.197382167))
            Line((203.376832377, 29.197382167), (203.99871028, 29.189619781))
            ThreePointArc((203.99871028, 29.189619781), (204.038133126, 29.417006985), (204.064636222, 29.646259439))
            Line((204.064636222, 29.646259439), (203.465957348, 29.814711173))
            Line((203.465957348, 29.814711173), (203.469502385, 30.098719237))
            Line((203.469502385, 30.098719237), (204.072199365, 30.252175193))
            ThreePointArc((204.072199365, 30.252175193), (204.051426772, 30.48201775), (204.017691895, 30.710318122))
            Line((204.017691895, 30.710318122), (203.395813992, 30.718080508))
            Line((203.395813992, 30.718080508), (203.325731539, 30.993328755))
            Line((203.325731539, 30.993328755), (203.868174794, 31.297545283))
            ThreePointArc((203.868174794, 31.297545283), (203.788622379, 31.514179802), (203.696948506, 31.725969798))
            Line((203.696948506, 31.725969798), (203.094251525, 31.572513843))
            Line((203.094251525, 31.572513843), (202.955317585, 31.82024456))
            Line((202.955317585, 31.82024456), (203.400540503, 32.254489806))
        make_face()
        with Locations((200, 30)):
            Circle(CAVITY1_3_OUTLINE_R, mode=Mode.SUBTRACT)
    extrude(amount=CAVITY1_3_DEPTH, mode=Mode.SUBTRACT)

    # Cavity1 4 outline → Cavity1 4 (revolve, cut)
    with BuildSketch(Plane(origin=(200, 0, -30), x_dir=(1, 0, 0), z_dir=(0, 0, 1))):
        Polygon((2.805, 6), (2.805, 4.98), (5.61, 4.98), (4.59, 6), align=None)
    revolve(axis=Axis((200, 0, -30), (0, 1, 0)), mode=Mode.SUBTRACT)

    # Sketch6 → Cut-Extrude4 (cut)
    with BuildSketch(Plane.XZ):
        with Locations((183.022971201, -13.441566555)):
            Circle(SKETCH6_R)
        with Locations((186.673945136, -17.002519984)):
            Circle(SKETCH6_R)
        with Locations((190.324919072, -20.563473413)):
            Circle(SKETCH6_R)
        with Locations((193.975893007, -24.124426842)):
            Circle(SKETCH6_R)
        with Locations((205.875573158, -23.975893007)):
            Circle(SKETCH6_R)
        with Locations((209.436526587, -20.324919072)):
            Circle(SKETCH6_R)
        with Locations((212.997480016, -16.673945136)):
            Circle(SKETCH6_R)
        with Locations((216.558433445, -13.022971201)):
            Circle(SKETCH6_R)
        with Locations((206.024106993, -35.875573158)):
            Circle(SKETCH6_R)
        with Locations((209.675080928, -39.436526587)):
            Circle(SKETCH6_R)
        with Locations((213.326054864, -42.997480016)):
            Circle(SKETCH6_R)
        with Locations((216.977028799, -46.558433445)):
            Circle(SKETCH6_R)
        with Locations((183.441566555, -46.977028799)):
            Circle(SKETCH6_R)
        with Locations((187.002519984, -43.326054864)):
            Circle(SKETCH6_R)
        with Locations((190.563473413, -39.675080928)):
            Circle(SKETCH6_R)
        with Locations((194.124426842, -36.024106993)):
            Circle(SKETCH6_R)
        with Locations((200, -30)):
            Circle(SKETCH6_R_2)
    extrude(amount=-CUT_EXTRUDE4_DEPTH, mode=Mode.SUBTRACT)

    # Sketch7 → Cut-Extrude5 (cut)
    with BuildSketch(Plane.XZ.offset(-4.98).offset(CUT_EXTRUDE5_START)):
        with Locations((200, -30)):
            Circle(SKETCH7_R)
    extrude(amount=CUT_EXTRUDE5_DEPTH, mode=Mode.SUBTRACT)


solid = part.part
